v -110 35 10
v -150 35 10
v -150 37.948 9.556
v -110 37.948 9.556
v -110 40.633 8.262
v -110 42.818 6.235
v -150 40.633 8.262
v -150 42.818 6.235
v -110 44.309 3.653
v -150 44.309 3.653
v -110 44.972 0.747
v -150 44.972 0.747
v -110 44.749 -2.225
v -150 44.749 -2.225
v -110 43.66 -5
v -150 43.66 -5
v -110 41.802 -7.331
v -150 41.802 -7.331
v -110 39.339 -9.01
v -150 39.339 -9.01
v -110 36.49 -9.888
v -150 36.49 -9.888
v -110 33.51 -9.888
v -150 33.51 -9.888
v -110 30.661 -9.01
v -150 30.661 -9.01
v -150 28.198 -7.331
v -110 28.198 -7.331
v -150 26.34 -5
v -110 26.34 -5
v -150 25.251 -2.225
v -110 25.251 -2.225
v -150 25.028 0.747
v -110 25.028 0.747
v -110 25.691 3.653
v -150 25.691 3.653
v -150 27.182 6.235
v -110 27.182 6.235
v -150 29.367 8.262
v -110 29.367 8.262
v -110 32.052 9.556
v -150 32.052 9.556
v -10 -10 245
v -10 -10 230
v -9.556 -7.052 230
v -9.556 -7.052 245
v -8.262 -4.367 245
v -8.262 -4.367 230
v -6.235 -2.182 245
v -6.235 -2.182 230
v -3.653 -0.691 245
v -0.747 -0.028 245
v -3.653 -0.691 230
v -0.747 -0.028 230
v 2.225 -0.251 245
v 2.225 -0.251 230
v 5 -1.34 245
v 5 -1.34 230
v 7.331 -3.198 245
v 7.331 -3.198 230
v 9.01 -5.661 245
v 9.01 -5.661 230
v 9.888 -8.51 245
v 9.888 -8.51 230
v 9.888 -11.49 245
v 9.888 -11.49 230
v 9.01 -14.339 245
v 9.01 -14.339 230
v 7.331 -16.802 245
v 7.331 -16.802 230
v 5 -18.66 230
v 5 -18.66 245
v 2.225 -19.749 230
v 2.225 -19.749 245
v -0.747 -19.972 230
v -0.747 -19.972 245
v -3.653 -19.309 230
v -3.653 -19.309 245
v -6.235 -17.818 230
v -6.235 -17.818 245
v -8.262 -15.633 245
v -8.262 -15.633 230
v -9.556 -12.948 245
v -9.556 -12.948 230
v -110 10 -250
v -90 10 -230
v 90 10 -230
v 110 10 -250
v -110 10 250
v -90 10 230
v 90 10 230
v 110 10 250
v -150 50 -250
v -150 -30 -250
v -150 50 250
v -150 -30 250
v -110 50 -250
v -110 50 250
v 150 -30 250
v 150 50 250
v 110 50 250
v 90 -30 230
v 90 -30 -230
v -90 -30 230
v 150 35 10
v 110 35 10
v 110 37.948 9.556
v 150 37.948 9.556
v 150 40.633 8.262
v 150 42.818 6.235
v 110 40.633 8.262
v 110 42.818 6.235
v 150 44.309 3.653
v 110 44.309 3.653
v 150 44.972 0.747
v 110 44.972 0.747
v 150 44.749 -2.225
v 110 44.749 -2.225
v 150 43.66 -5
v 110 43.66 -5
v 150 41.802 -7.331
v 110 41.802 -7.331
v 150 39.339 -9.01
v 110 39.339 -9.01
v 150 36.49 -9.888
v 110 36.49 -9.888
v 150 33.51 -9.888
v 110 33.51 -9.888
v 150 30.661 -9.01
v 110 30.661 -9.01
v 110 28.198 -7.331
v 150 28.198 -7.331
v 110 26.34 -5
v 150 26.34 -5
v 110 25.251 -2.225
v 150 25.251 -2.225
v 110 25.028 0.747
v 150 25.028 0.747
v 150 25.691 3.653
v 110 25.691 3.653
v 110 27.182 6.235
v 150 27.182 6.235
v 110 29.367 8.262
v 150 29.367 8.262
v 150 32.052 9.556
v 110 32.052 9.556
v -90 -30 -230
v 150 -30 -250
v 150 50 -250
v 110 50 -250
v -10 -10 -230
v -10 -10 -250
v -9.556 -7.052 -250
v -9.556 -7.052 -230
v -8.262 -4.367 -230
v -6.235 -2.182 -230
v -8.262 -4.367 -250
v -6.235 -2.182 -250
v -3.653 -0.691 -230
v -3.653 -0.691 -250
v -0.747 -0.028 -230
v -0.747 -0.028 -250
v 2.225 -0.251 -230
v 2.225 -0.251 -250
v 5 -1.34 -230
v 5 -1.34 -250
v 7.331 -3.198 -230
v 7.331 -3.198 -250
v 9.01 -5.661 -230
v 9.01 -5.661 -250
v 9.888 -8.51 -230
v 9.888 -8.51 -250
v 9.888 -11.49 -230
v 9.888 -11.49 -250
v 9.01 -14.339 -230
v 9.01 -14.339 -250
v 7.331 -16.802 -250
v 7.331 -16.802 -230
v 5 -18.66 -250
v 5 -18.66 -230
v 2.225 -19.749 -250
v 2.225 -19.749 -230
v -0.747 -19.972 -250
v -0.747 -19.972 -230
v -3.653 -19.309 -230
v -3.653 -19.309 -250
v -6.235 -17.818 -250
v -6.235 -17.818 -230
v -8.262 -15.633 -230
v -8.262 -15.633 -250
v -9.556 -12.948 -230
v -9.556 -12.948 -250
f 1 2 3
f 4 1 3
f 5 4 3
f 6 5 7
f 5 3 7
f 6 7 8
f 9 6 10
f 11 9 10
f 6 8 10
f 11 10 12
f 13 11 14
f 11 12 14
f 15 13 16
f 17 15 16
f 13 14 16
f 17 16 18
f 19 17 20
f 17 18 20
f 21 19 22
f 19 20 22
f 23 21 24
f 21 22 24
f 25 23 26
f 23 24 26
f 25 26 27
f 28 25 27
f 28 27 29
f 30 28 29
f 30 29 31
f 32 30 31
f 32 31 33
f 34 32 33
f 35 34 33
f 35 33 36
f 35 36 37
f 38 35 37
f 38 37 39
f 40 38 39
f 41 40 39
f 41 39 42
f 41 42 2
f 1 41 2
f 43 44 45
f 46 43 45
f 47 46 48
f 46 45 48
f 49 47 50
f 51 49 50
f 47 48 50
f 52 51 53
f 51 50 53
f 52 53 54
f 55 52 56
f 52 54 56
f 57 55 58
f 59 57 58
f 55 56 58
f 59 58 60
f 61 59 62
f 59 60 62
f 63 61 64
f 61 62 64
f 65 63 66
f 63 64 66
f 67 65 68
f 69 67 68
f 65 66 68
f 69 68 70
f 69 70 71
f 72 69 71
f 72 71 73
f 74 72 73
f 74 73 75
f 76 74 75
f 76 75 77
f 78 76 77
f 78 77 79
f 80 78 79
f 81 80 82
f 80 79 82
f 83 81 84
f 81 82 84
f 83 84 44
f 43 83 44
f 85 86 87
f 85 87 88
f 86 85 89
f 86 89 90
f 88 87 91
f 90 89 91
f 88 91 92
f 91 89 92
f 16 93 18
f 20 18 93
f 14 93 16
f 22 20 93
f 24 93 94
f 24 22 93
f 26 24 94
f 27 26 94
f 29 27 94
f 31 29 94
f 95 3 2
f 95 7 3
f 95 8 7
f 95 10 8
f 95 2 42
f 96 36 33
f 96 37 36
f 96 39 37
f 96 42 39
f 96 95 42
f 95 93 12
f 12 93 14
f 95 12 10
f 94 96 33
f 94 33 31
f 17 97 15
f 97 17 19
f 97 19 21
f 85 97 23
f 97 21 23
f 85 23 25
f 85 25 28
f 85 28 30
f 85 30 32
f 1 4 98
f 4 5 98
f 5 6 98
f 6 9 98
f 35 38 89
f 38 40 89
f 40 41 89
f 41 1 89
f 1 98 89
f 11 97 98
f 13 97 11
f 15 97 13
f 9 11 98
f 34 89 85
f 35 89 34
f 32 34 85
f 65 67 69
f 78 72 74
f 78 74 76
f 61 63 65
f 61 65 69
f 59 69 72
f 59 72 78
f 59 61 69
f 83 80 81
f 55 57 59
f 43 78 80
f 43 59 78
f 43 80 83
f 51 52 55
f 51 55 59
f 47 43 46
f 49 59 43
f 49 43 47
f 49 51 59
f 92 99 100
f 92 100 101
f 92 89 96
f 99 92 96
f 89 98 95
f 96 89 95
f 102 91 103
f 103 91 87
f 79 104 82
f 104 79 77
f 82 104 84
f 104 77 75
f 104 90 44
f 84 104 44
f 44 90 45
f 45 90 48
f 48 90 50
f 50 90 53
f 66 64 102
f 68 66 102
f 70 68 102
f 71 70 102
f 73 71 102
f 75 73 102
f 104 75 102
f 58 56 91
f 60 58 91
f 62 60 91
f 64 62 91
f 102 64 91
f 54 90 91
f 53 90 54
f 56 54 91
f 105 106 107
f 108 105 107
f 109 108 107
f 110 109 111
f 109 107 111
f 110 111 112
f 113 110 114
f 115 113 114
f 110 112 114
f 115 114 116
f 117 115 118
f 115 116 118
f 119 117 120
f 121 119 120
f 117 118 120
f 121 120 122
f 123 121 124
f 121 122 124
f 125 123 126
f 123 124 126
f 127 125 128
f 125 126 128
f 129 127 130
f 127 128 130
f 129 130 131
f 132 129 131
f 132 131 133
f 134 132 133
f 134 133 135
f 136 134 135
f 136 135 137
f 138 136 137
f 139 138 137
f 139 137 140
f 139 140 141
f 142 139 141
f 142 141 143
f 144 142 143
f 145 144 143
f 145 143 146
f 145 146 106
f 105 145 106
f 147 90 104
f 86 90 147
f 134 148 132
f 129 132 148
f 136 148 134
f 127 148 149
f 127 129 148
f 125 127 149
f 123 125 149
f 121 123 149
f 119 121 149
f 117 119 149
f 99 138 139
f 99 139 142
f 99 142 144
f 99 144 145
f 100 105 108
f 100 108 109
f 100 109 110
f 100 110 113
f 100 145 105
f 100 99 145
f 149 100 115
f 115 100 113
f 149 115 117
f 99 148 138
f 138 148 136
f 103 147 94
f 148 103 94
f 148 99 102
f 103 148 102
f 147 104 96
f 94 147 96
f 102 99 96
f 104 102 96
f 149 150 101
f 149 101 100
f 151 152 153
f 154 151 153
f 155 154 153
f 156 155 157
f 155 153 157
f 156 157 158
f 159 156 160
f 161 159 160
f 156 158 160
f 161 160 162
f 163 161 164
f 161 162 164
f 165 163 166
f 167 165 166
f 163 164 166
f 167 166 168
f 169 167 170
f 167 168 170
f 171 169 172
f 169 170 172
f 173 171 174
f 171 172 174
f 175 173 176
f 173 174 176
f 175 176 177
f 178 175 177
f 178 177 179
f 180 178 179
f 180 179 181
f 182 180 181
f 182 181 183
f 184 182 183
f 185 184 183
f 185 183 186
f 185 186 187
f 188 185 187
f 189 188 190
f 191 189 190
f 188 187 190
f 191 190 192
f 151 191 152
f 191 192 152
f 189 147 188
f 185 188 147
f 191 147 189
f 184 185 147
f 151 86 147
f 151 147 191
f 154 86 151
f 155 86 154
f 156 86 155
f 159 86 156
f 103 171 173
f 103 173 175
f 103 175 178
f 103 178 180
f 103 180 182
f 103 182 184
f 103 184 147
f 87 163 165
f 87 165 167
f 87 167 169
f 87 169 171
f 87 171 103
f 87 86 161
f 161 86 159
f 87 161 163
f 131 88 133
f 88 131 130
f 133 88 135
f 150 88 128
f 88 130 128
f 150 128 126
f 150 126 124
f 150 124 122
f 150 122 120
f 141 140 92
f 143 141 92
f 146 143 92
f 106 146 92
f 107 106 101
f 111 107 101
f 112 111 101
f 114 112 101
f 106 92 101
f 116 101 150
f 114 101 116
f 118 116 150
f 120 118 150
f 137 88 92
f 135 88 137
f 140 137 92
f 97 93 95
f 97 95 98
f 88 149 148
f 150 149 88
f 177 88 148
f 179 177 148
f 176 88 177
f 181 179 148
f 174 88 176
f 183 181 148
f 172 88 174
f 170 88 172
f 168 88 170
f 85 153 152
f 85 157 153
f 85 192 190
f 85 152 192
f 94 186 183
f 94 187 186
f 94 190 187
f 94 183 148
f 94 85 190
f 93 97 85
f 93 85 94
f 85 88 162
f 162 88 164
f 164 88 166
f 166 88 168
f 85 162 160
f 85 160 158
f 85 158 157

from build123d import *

# Parameters (mm, degrees)
BOSS_EXTRUDE1_DEPTH = 250
SKETCH2_W           = 180
SKETCH2_H           = 460
CUT_EXTRUDE1_DEPTH  = 41
SKETCH5_R           = 10
CUT_EXTRUDE5_DEPTH  = 15
SKETCH6_R           = 10
CUT_EXTRUDE6_DEPTH  = 20
SKETCH7_R           = 10
CUT_EXTRUDE7_DEPTH  = 300


with BuildPart() as part:
    # Sketch1 → Boss-Extrude1 (new body, symmetric)
    with BuildSketch(Plane.XY):
        Polygon((-110, 10), (110, 10), (110, 50), (150, 50), (150, 10), (150, -30), (-150, -30), (-150, 10), (-150, 50), (-110, 50), align=None)
    extrude(amount=BOSS_EXTRUDE1_DEPTH, both=True)

    # Sketch2 → Cut-Extrude1 (cut, through all)
    with BuildSketch(Plane(origin=(0, 10, 0), x_dir=(1, 0, 0), z_dir=(0, 1, 0))):
        Rectangle(SKETCH2_W, SKETCH2_H)
    extrude(amount=-CUT_EXTRUDE1_DEPTH, mode=Mode.SUBTRACT)

    # Sketch5 → Cut-Extrude5 (cut)
    with BuildSketch(Plane(origin=(0, 0, 230), x_dir=(-1, 0, 0), z_dir=(0, 0, -1))):
        with Locations((0, -10)):
            Circle(SKETCH5_R)
    extrude(amount=-CUT_EXTRUDE5_DEPTH, mode=Mode.SUBTRACT)

    # Sketch6 → Cut-Extrude6 (cut)
    with BuildSketch(Plane(origin=(0, 0, -250), x_dir=(-1, 0, 0), z_dir=(0, 0, -1))):
        with Locations((0, -10)):
            Circle(SKETCH6_R)
    extrude(amount=-CUT_EXTRUDE6_DEPTH, mode=Mode.SUBTRACT)

    # Sketch7 → Cut-Extrude7 (cut)
    with BuildSketch(Plane.ZY.offset(150)):
        with Locations((0, 35)):
            Circle(SKETCH7_R)
    extrude(amount=-CUT_EXTRUDE7_DEPTH, mode=Mode.SUBTRACT)


solid = part.part
